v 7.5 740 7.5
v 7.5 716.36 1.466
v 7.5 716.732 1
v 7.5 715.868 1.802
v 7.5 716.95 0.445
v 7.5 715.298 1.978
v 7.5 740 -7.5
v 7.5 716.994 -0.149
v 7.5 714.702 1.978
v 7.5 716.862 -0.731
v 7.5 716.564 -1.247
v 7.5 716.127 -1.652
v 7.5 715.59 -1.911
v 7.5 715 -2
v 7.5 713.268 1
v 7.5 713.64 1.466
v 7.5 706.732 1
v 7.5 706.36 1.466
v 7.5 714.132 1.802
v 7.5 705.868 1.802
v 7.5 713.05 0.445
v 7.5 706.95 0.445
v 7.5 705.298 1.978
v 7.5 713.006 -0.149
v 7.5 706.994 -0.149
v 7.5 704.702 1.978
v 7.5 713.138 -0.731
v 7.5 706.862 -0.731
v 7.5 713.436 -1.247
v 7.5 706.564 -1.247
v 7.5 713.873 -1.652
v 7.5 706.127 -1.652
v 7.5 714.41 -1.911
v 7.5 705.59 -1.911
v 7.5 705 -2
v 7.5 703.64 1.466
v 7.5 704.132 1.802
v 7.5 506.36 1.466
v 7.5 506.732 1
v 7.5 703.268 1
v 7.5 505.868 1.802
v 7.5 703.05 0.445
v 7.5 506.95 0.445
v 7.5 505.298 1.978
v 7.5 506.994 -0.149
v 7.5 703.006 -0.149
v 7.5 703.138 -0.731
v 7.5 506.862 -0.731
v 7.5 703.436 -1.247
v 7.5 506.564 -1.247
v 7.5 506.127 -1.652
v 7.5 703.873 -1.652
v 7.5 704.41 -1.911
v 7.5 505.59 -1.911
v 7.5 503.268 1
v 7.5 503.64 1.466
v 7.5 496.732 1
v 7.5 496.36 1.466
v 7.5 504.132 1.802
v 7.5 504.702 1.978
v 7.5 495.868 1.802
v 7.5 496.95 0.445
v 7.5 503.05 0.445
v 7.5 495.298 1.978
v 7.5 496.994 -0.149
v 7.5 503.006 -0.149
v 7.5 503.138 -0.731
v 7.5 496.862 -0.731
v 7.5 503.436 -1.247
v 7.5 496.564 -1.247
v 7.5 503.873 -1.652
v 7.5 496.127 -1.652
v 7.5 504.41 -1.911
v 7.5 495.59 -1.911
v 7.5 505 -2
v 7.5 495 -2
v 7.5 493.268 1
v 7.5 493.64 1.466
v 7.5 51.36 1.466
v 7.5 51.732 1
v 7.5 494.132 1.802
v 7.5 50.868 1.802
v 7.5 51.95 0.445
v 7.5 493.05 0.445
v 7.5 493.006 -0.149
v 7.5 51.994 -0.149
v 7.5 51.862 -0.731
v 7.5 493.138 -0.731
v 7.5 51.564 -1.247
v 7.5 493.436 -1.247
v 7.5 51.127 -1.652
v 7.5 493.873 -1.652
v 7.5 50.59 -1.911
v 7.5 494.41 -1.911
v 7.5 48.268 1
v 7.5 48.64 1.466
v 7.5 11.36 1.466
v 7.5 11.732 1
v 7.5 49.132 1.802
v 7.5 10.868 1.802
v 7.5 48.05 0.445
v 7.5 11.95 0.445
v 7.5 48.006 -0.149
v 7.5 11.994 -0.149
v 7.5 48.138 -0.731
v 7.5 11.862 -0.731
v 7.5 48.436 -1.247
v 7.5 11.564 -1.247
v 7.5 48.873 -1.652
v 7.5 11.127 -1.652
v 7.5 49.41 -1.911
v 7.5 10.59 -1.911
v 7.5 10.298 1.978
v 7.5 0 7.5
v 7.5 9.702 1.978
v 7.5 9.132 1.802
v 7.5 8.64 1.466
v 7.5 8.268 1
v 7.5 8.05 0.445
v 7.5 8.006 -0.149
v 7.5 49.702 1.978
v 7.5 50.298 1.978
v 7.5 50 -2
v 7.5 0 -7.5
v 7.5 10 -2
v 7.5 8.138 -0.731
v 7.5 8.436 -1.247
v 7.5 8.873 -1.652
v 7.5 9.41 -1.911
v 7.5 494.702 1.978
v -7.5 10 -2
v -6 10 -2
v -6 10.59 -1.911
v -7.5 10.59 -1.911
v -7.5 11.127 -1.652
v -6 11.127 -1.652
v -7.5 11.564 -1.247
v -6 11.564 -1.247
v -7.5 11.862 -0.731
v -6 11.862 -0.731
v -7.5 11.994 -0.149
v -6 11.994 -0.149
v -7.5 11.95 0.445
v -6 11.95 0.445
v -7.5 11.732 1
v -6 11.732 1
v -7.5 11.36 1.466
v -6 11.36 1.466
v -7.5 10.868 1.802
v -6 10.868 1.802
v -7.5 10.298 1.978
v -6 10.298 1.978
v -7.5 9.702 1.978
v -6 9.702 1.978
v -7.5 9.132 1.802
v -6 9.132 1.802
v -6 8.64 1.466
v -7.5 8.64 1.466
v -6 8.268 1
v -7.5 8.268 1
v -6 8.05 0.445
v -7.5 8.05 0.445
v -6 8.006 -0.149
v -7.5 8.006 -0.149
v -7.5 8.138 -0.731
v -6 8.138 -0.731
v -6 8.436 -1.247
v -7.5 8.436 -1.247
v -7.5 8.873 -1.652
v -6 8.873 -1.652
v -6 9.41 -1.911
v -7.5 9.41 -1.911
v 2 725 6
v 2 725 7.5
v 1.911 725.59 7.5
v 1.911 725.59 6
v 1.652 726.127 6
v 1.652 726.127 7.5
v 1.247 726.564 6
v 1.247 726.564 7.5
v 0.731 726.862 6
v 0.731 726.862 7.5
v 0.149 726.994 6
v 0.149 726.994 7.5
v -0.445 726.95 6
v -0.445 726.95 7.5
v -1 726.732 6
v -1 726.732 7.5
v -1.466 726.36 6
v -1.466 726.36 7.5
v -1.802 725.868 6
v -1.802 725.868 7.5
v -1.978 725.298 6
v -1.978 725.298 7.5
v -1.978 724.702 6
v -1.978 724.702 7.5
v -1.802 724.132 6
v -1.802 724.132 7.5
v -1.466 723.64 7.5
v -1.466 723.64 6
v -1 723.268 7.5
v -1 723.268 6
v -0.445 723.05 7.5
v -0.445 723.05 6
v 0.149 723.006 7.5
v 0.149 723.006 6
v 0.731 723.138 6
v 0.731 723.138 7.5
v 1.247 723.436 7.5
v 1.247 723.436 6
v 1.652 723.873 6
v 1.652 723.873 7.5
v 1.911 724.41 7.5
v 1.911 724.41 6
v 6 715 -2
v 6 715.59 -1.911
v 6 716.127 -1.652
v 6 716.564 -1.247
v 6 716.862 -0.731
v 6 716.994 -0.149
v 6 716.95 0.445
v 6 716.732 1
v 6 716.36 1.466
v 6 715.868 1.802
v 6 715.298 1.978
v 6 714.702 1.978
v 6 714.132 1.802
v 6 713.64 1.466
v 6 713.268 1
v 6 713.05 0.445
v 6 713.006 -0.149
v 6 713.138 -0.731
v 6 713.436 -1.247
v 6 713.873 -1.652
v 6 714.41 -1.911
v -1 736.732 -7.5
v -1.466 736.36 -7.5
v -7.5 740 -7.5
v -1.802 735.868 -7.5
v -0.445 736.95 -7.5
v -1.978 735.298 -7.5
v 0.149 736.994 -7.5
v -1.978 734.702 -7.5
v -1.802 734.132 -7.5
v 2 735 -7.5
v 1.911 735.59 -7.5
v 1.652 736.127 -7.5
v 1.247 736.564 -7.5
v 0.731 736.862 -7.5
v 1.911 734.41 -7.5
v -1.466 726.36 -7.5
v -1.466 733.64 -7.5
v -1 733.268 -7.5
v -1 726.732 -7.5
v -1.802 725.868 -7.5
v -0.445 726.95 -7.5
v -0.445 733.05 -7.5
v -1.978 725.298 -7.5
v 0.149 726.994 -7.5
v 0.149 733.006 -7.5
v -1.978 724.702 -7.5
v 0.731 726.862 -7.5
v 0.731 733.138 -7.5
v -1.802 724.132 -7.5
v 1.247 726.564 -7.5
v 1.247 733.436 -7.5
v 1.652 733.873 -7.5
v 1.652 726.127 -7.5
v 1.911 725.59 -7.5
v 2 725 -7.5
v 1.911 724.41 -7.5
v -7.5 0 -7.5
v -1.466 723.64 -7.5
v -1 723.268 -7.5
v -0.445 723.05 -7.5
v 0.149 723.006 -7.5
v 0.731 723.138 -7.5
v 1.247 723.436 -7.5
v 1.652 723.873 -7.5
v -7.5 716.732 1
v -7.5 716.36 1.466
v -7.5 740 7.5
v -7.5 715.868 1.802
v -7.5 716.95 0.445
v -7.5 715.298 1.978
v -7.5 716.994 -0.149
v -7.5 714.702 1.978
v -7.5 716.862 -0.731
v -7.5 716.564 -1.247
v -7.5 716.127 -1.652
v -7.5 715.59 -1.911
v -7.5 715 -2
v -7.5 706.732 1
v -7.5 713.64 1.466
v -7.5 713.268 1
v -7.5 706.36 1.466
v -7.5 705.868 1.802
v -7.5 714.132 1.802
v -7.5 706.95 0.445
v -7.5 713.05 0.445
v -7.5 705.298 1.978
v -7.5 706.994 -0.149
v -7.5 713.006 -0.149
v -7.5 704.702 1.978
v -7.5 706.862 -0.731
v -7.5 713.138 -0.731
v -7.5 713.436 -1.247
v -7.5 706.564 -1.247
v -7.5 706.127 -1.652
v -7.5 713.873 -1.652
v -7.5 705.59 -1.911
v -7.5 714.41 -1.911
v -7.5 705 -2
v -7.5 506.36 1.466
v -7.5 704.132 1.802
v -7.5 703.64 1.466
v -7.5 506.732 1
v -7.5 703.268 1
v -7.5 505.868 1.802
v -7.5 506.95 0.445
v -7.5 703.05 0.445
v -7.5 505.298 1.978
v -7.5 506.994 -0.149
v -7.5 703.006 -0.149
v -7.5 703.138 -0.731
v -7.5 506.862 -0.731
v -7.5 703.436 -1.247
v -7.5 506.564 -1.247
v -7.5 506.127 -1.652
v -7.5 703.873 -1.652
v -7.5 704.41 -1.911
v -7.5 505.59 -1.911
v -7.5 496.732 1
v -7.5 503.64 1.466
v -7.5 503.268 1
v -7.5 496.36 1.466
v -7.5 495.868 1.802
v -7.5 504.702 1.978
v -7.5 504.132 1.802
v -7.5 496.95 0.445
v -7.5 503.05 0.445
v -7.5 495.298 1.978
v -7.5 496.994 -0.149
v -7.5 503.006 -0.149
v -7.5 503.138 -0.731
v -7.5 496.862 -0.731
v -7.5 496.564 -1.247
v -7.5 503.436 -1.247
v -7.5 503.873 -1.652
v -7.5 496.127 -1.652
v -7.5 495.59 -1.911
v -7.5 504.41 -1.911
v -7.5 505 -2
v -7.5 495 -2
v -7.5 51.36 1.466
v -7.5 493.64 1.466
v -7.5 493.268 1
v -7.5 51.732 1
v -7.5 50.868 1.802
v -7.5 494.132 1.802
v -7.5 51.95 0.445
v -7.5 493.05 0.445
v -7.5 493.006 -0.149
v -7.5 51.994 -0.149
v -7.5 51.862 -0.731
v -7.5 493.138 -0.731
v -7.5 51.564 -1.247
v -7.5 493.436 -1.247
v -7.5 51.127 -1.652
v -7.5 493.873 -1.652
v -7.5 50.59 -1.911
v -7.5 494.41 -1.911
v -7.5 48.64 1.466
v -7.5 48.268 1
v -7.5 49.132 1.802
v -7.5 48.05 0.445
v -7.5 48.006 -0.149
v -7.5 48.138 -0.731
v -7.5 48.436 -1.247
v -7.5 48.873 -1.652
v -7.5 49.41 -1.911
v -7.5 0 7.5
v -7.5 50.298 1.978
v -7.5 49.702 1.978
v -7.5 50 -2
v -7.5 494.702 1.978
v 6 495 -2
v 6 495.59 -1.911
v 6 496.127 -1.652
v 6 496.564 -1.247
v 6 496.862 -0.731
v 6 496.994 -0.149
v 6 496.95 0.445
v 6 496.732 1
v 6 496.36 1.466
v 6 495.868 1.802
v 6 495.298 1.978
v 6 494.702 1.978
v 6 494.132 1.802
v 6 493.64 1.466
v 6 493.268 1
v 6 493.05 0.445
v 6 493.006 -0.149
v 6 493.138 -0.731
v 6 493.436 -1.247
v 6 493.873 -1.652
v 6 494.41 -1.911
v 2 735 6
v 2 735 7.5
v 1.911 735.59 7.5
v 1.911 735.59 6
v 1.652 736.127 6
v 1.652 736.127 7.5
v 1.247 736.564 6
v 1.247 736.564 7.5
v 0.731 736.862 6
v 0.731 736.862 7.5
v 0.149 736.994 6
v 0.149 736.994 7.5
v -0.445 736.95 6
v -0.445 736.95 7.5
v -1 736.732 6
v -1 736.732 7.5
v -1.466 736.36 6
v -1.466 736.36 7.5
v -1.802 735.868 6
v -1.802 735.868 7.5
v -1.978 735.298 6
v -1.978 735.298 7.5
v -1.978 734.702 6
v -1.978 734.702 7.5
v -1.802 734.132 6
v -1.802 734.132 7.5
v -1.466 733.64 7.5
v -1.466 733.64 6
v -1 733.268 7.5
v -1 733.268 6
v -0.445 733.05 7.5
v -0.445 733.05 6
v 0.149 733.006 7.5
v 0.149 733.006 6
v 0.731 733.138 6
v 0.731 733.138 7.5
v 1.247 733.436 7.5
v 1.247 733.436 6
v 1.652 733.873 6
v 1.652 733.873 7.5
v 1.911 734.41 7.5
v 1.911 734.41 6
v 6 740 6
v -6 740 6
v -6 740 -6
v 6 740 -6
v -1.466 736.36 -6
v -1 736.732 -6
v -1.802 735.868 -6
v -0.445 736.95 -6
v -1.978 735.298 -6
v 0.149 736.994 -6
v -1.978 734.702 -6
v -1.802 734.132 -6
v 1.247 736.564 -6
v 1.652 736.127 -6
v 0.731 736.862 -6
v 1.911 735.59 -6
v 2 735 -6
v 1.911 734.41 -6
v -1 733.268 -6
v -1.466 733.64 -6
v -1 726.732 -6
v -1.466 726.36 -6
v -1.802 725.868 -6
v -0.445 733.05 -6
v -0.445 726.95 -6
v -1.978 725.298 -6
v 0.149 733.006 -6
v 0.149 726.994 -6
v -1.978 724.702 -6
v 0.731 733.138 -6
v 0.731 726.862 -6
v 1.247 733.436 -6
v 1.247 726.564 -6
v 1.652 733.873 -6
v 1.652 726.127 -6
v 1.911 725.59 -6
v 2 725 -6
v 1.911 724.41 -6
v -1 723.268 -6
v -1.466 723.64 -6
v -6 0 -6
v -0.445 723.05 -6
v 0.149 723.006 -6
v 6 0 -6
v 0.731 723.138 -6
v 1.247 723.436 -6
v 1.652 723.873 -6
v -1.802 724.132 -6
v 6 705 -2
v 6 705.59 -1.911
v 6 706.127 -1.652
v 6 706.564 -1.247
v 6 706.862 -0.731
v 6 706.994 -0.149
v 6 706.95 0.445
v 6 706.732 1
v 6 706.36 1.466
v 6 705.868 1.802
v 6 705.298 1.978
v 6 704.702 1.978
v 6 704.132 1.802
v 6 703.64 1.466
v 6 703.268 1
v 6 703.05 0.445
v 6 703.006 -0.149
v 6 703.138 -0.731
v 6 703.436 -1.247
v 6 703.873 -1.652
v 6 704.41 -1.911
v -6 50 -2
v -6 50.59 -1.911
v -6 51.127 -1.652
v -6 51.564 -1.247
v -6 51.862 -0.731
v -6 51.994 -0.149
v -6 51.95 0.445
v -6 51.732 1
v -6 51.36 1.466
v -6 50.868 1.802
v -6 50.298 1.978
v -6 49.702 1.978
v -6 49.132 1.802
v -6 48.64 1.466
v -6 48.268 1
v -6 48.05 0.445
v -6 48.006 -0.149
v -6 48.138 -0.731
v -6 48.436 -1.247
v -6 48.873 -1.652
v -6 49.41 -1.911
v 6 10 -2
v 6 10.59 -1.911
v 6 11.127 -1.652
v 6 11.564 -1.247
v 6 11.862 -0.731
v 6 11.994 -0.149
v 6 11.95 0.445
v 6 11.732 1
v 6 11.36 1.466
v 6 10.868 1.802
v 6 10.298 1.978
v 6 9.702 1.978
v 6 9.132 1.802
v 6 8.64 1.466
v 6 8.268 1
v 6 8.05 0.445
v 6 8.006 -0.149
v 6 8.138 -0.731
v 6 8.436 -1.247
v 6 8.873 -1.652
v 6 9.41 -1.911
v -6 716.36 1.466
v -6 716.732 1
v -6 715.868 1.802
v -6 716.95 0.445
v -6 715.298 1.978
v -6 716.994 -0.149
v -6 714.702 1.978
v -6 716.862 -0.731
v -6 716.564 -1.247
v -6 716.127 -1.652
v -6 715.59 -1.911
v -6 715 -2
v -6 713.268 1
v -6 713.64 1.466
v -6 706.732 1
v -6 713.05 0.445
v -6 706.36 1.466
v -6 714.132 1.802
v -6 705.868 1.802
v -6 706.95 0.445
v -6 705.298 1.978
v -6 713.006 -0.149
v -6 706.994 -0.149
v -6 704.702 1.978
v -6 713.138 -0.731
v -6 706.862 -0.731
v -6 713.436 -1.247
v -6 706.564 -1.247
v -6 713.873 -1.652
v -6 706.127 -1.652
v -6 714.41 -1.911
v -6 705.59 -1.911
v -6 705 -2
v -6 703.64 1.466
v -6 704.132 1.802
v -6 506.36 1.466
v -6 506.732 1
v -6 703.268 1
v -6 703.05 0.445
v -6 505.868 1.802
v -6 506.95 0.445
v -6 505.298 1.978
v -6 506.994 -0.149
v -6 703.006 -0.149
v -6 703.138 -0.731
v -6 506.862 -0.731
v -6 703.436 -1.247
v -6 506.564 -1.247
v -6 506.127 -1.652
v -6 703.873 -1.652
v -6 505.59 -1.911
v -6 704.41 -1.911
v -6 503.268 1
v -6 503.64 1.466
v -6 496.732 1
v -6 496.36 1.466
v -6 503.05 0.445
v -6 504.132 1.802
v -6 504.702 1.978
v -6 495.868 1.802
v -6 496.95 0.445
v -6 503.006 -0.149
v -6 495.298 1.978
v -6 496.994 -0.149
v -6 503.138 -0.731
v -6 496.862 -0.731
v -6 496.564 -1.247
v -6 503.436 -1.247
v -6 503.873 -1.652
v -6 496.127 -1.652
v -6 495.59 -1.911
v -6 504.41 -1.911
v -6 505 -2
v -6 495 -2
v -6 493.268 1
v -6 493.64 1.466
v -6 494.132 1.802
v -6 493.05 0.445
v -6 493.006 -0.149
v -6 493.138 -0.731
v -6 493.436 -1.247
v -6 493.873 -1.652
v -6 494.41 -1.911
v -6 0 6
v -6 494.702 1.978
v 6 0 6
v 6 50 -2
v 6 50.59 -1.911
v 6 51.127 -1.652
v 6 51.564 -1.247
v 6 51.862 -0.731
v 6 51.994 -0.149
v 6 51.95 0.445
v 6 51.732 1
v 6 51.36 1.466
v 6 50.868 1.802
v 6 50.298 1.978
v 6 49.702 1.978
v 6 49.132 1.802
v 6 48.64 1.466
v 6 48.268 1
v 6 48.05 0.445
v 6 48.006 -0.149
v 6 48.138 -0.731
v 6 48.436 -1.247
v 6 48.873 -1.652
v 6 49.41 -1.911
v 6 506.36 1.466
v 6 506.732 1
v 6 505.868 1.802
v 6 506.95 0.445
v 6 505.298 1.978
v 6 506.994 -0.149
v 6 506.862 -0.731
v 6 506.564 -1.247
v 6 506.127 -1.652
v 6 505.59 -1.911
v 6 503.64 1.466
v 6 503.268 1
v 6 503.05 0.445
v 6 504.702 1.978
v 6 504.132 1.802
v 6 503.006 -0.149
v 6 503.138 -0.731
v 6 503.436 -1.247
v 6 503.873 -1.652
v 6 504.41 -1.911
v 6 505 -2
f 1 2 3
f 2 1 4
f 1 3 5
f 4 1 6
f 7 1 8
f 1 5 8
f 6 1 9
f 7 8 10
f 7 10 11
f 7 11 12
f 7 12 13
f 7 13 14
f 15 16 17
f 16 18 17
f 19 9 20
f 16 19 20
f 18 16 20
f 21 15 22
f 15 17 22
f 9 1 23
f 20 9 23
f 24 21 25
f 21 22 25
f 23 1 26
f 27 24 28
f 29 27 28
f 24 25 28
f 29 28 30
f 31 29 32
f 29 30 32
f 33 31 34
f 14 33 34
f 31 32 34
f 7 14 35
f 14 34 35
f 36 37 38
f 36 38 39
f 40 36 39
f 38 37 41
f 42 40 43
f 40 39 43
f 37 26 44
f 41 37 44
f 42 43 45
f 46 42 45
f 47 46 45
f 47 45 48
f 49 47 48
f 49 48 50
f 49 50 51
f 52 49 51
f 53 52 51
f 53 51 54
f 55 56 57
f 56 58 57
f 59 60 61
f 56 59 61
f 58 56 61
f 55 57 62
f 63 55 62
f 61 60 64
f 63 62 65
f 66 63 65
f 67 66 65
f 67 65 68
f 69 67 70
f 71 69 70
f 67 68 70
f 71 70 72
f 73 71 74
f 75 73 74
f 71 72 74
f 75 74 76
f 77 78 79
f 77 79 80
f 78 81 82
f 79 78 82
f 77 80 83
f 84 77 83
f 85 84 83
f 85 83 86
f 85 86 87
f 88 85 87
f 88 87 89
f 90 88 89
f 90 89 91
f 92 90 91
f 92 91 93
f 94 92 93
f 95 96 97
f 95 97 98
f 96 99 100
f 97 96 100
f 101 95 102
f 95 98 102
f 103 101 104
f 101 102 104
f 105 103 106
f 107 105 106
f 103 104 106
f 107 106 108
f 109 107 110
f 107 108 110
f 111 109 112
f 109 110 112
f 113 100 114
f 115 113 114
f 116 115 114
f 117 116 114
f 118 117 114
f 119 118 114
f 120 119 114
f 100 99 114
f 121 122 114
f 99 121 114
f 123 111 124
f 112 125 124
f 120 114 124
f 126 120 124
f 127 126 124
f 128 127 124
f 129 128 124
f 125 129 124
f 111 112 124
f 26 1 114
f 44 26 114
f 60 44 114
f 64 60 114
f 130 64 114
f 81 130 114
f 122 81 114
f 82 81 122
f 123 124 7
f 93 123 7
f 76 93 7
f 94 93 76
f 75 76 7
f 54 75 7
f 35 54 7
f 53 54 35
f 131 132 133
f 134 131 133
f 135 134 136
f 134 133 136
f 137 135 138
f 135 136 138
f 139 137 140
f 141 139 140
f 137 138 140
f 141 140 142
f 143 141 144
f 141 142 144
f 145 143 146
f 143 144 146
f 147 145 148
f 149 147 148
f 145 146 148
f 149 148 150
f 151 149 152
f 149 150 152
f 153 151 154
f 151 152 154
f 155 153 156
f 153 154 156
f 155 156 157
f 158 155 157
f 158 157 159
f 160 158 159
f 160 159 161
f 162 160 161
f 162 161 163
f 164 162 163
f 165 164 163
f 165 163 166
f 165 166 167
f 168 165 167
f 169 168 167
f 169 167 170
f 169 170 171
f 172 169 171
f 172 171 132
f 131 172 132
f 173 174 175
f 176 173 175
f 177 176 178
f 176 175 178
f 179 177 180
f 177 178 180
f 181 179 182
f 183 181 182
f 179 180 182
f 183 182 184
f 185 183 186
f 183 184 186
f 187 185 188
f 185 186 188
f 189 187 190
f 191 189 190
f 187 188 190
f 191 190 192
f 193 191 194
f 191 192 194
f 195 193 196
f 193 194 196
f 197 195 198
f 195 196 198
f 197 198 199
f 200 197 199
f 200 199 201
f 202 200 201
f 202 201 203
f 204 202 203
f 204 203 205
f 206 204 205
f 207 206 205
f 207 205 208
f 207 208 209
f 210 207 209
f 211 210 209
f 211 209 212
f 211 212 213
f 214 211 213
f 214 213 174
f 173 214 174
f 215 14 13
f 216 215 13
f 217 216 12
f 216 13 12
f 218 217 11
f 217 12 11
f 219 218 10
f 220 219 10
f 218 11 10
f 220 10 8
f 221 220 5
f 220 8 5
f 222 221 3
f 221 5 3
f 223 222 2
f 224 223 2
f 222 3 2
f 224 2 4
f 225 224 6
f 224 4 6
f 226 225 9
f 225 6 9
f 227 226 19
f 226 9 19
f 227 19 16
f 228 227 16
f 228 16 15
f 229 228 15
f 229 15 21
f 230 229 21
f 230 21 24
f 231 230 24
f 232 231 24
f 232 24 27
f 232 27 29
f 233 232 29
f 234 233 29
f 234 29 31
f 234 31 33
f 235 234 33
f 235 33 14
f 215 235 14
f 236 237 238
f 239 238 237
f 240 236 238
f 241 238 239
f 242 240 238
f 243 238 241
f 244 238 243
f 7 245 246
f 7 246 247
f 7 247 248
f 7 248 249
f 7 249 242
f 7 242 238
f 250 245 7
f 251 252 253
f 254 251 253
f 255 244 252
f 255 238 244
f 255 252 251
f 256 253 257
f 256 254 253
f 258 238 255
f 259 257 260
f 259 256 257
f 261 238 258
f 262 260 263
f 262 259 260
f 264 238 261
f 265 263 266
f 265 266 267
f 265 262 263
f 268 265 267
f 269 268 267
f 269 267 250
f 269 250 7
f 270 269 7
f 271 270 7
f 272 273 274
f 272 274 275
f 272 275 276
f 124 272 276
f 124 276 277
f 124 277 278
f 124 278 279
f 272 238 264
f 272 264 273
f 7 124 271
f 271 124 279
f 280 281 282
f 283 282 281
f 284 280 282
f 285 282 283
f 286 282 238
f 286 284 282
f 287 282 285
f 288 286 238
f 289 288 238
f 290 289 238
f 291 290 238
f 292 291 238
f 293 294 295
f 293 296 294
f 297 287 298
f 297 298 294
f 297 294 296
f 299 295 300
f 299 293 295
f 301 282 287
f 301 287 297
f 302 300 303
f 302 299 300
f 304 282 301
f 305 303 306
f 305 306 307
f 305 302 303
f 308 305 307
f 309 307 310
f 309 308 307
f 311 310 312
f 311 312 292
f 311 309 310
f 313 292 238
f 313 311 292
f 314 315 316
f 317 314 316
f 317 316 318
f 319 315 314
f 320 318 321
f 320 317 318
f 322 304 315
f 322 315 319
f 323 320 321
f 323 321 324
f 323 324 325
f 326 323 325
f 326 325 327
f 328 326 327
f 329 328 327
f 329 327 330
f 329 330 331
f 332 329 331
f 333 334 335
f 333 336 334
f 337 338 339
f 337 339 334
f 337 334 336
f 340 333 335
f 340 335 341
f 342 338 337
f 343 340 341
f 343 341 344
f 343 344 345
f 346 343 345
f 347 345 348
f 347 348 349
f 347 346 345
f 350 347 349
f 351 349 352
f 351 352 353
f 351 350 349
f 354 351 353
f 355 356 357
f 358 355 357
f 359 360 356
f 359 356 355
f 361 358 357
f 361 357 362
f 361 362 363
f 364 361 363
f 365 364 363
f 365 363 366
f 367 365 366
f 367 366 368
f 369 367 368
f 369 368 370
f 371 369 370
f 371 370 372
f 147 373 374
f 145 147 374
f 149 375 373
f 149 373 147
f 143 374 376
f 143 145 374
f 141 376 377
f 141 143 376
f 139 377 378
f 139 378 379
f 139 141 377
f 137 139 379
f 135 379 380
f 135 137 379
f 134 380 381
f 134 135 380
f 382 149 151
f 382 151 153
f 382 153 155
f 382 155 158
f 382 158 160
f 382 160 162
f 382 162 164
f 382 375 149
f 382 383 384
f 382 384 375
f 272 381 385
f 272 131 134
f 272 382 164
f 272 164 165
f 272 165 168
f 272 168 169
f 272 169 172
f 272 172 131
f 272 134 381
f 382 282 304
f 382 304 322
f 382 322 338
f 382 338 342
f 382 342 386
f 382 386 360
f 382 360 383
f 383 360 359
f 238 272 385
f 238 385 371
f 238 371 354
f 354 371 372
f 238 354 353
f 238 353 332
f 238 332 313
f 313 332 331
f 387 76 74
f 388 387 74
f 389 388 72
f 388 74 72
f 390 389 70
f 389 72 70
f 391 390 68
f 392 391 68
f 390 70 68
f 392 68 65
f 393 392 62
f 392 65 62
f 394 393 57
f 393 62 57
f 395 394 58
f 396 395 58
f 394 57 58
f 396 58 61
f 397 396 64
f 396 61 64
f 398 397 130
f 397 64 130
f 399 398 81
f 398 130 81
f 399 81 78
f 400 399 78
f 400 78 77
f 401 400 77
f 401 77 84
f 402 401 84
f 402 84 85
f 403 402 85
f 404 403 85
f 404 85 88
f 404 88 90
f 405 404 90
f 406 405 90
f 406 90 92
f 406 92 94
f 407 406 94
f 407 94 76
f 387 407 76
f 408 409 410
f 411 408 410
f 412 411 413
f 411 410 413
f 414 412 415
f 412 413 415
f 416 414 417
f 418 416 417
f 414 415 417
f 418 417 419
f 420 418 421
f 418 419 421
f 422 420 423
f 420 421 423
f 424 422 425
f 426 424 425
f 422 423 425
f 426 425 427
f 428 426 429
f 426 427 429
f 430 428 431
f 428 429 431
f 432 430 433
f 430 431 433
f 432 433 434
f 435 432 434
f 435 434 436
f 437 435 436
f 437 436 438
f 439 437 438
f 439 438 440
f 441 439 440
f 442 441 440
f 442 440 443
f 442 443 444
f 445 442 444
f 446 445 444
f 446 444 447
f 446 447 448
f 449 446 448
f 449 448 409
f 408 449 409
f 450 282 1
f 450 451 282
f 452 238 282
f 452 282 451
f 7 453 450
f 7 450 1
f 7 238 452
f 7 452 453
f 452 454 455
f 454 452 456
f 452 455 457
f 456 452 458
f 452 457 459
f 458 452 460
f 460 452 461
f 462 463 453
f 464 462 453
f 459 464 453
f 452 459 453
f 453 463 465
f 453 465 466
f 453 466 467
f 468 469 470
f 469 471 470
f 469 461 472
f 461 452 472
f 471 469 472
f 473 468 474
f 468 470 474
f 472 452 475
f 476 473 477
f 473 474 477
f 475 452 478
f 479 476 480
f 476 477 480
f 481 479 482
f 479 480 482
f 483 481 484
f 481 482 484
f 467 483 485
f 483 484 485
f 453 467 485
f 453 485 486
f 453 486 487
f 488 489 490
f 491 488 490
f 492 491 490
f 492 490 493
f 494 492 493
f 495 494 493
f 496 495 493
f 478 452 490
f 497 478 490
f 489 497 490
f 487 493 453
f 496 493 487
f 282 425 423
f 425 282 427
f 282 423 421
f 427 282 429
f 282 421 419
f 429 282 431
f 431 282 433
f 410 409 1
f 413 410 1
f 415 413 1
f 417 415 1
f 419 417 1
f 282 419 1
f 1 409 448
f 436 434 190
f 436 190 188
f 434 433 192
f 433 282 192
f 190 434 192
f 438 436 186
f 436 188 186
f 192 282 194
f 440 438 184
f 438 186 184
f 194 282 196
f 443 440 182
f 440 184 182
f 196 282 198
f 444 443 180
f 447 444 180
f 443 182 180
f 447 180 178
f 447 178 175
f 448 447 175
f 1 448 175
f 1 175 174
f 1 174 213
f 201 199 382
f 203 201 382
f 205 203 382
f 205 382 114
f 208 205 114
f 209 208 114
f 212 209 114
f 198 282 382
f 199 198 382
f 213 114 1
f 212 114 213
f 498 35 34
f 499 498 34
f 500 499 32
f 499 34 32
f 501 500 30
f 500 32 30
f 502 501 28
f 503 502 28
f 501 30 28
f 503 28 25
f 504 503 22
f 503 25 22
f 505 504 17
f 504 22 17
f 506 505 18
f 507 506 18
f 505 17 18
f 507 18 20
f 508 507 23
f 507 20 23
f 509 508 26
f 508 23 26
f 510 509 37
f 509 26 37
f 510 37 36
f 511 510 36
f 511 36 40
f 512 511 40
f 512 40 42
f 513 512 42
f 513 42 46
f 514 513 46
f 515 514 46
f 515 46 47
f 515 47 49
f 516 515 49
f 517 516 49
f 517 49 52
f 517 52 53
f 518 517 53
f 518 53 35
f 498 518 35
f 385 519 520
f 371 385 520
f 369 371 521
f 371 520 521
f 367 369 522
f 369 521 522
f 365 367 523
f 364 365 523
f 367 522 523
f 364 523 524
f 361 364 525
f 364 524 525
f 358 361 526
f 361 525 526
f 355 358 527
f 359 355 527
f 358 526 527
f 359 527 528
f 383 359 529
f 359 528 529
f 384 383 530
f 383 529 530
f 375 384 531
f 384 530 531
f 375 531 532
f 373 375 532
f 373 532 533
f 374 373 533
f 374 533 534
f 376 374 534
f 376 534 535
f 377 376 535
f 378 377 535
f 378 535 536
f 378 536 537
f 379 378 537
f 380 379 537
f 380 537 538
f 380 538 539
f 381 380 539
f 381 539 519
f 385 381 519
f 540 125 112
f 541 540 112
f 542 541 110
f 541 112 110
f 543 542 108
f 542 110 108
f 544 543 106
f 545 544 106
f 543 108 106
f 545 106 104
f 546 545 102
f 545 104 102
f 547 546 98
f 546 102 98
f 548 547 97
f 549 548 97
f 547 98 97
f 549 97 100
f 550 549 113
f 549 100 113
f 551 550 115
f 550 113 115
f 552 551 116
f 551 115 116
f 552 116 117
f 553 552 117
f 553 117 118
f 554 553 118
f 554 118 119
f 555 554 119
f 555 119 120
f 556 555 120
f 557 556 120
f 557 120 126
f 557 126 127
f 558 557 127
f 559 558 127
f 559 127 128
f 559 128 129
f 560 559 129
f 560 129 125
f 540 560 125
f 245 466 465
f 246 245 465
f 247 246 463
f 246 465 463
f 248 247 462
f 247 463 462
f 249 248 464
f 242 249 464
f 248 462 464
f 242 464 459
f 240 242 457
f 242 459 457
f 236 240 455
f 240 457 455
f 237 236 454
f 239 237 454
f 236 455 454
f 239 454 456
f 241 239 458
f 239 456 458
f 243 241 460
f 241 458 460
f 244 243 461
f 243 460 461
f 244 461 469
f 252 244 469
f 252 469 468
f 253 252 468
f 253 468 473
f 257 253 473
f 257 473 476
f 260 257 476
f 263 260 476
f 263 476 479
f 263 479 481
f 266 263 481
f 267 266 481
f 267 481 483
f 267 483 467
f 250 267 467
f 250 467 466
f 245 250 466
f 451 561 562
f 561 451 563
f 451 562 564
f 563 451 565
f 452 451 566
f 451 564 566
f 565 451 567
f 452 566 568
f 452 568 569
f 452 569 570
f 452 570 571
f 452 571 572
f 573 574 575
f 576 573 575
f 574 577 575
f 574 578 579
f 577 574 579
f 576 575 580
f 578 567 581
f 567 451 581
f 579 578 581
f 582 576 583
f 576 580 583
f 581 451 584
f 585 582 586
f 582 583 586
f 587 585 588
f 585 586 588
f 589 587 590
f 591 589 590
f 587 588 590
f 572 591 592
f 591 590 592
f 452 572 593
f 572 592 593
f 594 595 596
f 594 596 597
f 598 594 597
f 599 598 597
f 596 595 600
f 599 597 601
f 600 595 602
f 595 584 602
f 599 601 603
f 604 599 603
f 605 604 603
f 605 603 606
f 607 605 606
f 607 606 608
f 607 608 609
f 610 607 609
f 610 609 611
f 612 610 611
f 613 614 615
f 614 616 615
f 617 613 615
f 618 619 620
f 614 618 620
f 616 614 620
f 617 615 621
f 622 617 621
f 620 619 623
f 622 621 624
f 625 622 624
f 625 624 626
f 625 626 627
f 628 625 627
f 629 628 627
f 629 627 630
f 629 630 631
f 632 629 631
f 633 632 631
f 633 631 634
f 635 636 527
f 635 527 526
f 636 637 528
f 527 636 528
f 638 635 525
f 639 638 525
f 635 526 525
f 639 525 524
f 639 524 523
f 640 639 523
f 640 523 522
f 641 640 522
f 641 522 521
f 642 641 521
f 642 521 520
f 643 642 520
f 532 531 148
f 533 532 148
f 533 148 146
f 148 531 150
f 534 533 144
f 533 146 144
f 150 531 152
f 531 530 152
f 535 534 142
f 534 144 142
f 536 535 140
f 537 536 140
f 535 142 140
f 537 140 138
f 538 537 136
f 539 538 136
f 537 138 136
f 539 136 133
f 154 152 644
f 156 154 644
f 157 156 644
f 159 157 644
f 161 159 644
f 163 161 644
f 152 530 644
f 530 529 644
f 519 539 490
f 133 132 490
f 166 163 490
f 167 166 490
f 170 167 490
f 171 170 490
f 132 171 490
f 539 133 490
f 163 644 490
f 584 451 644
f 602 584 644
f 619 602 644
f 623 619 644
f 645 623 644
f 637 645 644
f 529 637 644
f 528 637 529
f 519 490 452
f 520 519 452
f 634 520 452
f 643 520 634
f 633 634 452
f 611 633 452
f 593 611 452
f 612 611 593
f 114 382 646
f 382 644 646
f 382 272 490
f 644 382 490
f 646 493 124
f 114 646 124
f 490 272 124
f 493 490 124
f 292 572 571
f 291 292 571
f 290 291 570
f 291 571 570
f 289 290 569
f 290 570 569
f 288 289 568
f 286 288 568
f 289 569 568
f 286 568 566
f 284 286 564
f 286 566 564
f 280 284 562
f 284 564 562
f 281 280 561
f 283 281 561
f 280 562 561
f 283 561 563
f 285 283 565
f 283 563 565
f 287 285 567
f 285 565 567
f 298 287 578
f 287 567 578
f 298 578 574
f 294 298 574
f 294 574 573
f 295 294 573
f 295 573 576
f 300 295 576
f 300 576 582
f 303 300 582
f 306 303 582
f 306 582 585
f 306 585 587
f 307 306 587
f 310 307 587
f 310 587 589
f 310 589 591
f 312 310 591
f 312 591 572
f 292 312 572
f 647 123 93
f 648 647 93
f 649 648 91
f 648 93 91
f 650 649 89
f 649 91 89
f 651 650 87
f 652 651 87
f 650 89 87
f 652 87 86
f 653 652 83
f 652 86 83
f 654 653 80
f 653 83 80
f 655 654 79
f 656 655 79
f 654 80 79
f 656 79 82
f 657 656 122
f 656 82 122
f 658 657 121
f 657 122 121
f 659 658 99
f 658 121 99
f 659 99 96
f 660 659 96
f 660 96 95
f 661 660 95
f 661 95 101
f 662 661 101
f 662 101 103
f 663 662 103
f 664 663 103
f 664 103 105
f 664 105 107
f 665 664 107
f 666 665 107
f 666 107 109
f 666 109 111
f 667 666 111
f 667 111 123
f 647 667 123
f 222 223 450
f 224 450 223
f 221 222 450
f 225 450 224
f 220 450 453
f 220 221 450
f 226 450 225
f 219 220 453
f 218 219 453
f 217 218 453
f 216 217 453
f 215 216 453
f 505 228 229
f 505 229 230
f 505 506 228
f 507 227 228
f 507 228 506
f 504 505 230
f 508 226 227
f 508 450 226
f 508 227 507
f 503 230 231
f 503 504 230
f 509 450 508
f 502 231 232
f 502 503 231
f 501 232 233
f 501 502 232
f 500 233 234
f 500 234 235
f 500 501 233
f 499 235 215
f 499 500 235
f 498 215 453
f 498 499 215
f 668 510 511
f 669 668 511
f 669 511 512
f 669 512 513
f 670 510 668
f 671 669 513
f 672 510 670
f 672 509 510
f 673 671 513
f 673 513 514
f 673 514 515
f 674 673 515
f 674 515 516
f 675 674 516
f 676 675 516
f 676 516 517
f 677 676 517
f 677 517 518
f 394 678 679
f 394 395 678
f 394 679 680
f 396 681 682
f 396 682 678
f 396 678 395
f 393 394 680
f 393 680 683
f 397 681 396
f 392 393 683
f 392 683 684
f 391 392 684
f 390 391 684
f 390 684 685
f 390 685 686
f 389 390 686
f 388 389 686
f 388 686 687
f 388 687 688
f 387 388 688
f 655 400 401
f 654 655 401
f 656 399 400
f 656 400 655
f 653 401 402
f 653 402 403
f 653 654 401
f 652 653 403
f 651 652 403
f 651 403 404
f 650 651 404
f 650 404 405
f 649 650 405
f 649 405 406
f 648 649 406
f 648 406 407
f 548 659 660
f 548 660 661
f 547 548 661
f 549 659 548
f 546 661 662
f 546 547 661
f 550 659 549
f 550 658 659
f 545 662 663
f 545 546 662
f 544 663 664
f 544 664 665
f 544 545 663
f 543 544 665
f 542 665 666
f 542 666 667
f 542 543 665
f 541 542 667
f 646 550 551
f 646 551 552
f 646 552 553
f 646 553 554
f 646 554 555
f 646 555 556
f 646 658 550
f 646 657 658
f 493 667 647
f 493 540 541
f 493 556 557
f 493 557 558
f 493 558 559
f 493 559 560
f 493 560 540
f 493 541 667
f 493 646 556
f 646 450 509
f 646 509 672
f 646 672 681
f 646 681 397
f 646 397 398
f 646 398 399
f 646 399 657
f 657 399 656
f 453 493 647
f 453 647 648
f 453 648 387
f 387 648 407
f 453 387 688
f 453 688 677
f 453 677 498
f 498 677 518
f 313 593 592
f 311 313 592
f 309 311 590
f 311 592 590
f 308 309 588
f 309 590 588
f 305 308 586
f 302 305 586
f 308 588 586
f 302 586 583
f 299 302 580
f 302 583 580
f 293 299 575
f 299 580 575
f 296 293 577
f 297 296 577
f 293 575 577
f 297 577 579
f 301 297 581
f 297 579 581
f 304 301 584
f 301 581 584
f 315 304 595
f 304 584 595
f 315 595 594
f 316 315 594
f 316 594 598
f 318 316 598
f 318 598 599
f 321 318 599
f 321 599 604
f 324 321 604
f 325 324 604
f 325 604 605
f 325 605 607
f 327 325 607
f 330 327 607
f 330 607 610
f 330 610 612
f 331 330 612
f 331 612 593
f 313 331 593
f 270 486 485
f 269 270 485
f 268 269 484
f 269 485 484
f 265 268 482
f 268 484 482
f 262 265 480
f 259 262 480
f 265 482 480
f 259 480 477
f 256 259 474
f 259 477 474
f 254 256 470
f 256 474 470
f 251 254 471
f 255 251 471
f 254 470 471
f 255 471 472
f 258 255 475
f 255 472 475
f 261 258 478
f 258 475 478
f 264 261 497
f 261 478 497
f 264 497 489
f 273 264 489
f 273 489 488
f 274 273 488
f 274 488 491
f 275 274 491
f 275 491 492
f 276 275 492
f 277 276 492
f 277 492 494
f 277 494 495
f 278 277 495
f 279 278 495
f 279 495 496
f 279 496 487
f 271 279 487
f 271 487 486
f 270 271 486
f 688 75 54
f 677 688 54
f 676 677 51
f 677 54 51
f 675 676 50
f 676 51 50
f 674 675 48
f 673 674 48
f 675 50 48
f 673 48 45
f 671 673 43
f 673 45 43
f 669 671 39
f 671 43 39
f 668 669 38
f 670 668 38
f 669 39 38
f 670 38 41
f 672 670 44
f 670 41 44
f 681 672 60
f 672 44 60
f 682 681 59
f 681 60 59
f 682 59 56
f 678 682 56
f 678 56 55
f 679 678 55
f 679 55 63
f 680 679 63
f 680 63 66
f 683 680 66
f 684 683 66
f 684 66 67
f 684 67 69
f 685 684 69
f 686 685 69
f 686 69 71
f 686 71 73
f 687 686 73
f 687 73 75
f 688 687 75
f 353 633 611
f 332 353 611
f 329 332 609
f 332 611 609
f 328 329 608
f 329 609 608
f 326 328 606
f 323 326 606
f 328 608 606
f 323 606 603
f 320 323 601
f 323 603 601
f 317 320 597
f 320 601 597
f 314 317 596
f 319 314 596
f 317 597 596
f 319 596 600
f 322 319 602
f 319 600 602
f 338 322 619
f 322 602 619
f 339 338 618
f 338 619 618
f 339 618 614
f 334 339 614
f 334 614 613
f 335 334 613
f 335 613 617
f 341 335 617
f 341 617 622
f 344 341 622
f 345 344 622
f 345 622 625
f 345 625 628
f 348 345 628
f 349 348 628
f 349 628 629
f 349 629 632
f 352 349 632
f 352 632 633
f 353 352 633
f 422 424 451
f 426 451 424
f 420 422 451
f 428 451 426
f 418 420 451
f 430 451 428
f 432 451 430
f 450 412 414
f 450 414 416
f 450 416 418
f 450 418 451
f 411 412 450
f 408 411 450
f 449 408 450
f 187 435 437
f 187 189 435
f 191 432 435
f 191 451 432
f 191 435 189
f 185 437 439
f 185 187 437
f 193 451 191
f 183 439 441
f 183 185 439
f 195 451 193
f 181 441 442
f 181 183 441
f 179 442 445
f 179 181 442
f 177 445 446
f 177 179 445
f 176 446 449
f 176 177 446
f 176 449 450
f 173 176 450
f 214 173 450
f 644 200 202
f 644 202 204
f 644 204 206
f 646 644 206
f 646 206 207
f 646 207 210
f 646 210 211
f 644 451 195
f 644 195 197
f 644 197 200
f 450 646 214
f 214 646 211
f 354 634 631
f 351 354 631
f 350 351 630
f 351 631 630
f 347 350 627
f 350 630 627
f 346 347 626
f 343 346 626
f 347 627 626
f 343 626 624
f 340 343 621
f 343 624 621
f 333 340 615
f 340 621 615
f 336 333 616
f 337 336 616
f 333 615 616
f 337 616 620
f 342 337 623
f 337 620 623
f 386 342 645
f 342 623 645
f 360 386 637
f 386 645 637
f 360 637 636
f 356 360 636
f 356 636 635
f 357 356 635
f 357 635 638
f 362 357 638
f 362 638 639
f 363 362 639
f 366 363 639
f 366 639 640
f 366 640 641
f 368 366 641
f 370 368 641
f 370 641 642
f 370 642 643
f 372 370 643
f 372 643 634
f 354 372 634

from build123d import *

# Parameters (mm, degrees)
SKETCH_1_W          = 15
SKETCH_1_H          = 15
SKETCH_1_W_2        = 12
SKETCH_1_H_2        = 12
EXTRUDE_1_DEPTH     = 740
SKETCH_2_R          = 2
CUT_EXTRUDE_1_DEPTH = 741.190009389
SKETCH_3_R          = 2
CUT_EXTRUDE_2_DEPTH = 741.190009389


with BuildPart() as part:
    # ｽｹｯﾁ1 → 押し出し-薄板1 (new body)
    with BuildSketch(Plane(origin=(0, 0, 0), x_dir=(1, 0, 0), z_dir=(0, 1, 0))):
        Rectangle(SKETCH_1_W, SKETCH_1_H)
        Rectangle(SKETCH_1_W_2, SKETCH_1_H_2, mode=Mode.SUBTRACT)
    extrude(amount=EXTRUDE_1_DEPTH)

    # ｽｹｯﾁ2 → ｶｯﾄ - 押し出し1 (cut, through all)
    with BuildSketch(Plane(origin=(7.5, 0, 0), x_dir=(0, 0, -1), z_dir=(1, 0, 0))):
        with Locations((0, 50)):
            Circle(SKETCH_2_R)
        with Locations((0, 10)):
            Circle(SKETCH_2_R)
        with Locations((0, 715)):
            Circle(SKETCH_2_R)
        with Locations((0, 705)):
            Circle(SKETCH_2_R)
        with Locations((0, 505)):
            Circle(SKETCH_2_R)
        with Locations((0, 495)):
            Circle(SKETCH_2_R)
    extrude(amount=-CUT_EXTRUDE_1_DEPTH, mode=Mode.SUBTRACT)

    # ｽｹｯﾁ3 → ｶｯﾄ - 押し出し2 (cut, through all)
    with BuildSketch(Plane.XY.offset(7.5)):
        with Locations((0, 735)):
            Circle(SKETCH_3_R)
        with Locations((0, 725)):
            Circle(SKETCH_3_R)
    extrude(amount=-CUT_EXTRUDE_2_DEPTH, mode=Mode.SUBTRACT)


solid = part.part
